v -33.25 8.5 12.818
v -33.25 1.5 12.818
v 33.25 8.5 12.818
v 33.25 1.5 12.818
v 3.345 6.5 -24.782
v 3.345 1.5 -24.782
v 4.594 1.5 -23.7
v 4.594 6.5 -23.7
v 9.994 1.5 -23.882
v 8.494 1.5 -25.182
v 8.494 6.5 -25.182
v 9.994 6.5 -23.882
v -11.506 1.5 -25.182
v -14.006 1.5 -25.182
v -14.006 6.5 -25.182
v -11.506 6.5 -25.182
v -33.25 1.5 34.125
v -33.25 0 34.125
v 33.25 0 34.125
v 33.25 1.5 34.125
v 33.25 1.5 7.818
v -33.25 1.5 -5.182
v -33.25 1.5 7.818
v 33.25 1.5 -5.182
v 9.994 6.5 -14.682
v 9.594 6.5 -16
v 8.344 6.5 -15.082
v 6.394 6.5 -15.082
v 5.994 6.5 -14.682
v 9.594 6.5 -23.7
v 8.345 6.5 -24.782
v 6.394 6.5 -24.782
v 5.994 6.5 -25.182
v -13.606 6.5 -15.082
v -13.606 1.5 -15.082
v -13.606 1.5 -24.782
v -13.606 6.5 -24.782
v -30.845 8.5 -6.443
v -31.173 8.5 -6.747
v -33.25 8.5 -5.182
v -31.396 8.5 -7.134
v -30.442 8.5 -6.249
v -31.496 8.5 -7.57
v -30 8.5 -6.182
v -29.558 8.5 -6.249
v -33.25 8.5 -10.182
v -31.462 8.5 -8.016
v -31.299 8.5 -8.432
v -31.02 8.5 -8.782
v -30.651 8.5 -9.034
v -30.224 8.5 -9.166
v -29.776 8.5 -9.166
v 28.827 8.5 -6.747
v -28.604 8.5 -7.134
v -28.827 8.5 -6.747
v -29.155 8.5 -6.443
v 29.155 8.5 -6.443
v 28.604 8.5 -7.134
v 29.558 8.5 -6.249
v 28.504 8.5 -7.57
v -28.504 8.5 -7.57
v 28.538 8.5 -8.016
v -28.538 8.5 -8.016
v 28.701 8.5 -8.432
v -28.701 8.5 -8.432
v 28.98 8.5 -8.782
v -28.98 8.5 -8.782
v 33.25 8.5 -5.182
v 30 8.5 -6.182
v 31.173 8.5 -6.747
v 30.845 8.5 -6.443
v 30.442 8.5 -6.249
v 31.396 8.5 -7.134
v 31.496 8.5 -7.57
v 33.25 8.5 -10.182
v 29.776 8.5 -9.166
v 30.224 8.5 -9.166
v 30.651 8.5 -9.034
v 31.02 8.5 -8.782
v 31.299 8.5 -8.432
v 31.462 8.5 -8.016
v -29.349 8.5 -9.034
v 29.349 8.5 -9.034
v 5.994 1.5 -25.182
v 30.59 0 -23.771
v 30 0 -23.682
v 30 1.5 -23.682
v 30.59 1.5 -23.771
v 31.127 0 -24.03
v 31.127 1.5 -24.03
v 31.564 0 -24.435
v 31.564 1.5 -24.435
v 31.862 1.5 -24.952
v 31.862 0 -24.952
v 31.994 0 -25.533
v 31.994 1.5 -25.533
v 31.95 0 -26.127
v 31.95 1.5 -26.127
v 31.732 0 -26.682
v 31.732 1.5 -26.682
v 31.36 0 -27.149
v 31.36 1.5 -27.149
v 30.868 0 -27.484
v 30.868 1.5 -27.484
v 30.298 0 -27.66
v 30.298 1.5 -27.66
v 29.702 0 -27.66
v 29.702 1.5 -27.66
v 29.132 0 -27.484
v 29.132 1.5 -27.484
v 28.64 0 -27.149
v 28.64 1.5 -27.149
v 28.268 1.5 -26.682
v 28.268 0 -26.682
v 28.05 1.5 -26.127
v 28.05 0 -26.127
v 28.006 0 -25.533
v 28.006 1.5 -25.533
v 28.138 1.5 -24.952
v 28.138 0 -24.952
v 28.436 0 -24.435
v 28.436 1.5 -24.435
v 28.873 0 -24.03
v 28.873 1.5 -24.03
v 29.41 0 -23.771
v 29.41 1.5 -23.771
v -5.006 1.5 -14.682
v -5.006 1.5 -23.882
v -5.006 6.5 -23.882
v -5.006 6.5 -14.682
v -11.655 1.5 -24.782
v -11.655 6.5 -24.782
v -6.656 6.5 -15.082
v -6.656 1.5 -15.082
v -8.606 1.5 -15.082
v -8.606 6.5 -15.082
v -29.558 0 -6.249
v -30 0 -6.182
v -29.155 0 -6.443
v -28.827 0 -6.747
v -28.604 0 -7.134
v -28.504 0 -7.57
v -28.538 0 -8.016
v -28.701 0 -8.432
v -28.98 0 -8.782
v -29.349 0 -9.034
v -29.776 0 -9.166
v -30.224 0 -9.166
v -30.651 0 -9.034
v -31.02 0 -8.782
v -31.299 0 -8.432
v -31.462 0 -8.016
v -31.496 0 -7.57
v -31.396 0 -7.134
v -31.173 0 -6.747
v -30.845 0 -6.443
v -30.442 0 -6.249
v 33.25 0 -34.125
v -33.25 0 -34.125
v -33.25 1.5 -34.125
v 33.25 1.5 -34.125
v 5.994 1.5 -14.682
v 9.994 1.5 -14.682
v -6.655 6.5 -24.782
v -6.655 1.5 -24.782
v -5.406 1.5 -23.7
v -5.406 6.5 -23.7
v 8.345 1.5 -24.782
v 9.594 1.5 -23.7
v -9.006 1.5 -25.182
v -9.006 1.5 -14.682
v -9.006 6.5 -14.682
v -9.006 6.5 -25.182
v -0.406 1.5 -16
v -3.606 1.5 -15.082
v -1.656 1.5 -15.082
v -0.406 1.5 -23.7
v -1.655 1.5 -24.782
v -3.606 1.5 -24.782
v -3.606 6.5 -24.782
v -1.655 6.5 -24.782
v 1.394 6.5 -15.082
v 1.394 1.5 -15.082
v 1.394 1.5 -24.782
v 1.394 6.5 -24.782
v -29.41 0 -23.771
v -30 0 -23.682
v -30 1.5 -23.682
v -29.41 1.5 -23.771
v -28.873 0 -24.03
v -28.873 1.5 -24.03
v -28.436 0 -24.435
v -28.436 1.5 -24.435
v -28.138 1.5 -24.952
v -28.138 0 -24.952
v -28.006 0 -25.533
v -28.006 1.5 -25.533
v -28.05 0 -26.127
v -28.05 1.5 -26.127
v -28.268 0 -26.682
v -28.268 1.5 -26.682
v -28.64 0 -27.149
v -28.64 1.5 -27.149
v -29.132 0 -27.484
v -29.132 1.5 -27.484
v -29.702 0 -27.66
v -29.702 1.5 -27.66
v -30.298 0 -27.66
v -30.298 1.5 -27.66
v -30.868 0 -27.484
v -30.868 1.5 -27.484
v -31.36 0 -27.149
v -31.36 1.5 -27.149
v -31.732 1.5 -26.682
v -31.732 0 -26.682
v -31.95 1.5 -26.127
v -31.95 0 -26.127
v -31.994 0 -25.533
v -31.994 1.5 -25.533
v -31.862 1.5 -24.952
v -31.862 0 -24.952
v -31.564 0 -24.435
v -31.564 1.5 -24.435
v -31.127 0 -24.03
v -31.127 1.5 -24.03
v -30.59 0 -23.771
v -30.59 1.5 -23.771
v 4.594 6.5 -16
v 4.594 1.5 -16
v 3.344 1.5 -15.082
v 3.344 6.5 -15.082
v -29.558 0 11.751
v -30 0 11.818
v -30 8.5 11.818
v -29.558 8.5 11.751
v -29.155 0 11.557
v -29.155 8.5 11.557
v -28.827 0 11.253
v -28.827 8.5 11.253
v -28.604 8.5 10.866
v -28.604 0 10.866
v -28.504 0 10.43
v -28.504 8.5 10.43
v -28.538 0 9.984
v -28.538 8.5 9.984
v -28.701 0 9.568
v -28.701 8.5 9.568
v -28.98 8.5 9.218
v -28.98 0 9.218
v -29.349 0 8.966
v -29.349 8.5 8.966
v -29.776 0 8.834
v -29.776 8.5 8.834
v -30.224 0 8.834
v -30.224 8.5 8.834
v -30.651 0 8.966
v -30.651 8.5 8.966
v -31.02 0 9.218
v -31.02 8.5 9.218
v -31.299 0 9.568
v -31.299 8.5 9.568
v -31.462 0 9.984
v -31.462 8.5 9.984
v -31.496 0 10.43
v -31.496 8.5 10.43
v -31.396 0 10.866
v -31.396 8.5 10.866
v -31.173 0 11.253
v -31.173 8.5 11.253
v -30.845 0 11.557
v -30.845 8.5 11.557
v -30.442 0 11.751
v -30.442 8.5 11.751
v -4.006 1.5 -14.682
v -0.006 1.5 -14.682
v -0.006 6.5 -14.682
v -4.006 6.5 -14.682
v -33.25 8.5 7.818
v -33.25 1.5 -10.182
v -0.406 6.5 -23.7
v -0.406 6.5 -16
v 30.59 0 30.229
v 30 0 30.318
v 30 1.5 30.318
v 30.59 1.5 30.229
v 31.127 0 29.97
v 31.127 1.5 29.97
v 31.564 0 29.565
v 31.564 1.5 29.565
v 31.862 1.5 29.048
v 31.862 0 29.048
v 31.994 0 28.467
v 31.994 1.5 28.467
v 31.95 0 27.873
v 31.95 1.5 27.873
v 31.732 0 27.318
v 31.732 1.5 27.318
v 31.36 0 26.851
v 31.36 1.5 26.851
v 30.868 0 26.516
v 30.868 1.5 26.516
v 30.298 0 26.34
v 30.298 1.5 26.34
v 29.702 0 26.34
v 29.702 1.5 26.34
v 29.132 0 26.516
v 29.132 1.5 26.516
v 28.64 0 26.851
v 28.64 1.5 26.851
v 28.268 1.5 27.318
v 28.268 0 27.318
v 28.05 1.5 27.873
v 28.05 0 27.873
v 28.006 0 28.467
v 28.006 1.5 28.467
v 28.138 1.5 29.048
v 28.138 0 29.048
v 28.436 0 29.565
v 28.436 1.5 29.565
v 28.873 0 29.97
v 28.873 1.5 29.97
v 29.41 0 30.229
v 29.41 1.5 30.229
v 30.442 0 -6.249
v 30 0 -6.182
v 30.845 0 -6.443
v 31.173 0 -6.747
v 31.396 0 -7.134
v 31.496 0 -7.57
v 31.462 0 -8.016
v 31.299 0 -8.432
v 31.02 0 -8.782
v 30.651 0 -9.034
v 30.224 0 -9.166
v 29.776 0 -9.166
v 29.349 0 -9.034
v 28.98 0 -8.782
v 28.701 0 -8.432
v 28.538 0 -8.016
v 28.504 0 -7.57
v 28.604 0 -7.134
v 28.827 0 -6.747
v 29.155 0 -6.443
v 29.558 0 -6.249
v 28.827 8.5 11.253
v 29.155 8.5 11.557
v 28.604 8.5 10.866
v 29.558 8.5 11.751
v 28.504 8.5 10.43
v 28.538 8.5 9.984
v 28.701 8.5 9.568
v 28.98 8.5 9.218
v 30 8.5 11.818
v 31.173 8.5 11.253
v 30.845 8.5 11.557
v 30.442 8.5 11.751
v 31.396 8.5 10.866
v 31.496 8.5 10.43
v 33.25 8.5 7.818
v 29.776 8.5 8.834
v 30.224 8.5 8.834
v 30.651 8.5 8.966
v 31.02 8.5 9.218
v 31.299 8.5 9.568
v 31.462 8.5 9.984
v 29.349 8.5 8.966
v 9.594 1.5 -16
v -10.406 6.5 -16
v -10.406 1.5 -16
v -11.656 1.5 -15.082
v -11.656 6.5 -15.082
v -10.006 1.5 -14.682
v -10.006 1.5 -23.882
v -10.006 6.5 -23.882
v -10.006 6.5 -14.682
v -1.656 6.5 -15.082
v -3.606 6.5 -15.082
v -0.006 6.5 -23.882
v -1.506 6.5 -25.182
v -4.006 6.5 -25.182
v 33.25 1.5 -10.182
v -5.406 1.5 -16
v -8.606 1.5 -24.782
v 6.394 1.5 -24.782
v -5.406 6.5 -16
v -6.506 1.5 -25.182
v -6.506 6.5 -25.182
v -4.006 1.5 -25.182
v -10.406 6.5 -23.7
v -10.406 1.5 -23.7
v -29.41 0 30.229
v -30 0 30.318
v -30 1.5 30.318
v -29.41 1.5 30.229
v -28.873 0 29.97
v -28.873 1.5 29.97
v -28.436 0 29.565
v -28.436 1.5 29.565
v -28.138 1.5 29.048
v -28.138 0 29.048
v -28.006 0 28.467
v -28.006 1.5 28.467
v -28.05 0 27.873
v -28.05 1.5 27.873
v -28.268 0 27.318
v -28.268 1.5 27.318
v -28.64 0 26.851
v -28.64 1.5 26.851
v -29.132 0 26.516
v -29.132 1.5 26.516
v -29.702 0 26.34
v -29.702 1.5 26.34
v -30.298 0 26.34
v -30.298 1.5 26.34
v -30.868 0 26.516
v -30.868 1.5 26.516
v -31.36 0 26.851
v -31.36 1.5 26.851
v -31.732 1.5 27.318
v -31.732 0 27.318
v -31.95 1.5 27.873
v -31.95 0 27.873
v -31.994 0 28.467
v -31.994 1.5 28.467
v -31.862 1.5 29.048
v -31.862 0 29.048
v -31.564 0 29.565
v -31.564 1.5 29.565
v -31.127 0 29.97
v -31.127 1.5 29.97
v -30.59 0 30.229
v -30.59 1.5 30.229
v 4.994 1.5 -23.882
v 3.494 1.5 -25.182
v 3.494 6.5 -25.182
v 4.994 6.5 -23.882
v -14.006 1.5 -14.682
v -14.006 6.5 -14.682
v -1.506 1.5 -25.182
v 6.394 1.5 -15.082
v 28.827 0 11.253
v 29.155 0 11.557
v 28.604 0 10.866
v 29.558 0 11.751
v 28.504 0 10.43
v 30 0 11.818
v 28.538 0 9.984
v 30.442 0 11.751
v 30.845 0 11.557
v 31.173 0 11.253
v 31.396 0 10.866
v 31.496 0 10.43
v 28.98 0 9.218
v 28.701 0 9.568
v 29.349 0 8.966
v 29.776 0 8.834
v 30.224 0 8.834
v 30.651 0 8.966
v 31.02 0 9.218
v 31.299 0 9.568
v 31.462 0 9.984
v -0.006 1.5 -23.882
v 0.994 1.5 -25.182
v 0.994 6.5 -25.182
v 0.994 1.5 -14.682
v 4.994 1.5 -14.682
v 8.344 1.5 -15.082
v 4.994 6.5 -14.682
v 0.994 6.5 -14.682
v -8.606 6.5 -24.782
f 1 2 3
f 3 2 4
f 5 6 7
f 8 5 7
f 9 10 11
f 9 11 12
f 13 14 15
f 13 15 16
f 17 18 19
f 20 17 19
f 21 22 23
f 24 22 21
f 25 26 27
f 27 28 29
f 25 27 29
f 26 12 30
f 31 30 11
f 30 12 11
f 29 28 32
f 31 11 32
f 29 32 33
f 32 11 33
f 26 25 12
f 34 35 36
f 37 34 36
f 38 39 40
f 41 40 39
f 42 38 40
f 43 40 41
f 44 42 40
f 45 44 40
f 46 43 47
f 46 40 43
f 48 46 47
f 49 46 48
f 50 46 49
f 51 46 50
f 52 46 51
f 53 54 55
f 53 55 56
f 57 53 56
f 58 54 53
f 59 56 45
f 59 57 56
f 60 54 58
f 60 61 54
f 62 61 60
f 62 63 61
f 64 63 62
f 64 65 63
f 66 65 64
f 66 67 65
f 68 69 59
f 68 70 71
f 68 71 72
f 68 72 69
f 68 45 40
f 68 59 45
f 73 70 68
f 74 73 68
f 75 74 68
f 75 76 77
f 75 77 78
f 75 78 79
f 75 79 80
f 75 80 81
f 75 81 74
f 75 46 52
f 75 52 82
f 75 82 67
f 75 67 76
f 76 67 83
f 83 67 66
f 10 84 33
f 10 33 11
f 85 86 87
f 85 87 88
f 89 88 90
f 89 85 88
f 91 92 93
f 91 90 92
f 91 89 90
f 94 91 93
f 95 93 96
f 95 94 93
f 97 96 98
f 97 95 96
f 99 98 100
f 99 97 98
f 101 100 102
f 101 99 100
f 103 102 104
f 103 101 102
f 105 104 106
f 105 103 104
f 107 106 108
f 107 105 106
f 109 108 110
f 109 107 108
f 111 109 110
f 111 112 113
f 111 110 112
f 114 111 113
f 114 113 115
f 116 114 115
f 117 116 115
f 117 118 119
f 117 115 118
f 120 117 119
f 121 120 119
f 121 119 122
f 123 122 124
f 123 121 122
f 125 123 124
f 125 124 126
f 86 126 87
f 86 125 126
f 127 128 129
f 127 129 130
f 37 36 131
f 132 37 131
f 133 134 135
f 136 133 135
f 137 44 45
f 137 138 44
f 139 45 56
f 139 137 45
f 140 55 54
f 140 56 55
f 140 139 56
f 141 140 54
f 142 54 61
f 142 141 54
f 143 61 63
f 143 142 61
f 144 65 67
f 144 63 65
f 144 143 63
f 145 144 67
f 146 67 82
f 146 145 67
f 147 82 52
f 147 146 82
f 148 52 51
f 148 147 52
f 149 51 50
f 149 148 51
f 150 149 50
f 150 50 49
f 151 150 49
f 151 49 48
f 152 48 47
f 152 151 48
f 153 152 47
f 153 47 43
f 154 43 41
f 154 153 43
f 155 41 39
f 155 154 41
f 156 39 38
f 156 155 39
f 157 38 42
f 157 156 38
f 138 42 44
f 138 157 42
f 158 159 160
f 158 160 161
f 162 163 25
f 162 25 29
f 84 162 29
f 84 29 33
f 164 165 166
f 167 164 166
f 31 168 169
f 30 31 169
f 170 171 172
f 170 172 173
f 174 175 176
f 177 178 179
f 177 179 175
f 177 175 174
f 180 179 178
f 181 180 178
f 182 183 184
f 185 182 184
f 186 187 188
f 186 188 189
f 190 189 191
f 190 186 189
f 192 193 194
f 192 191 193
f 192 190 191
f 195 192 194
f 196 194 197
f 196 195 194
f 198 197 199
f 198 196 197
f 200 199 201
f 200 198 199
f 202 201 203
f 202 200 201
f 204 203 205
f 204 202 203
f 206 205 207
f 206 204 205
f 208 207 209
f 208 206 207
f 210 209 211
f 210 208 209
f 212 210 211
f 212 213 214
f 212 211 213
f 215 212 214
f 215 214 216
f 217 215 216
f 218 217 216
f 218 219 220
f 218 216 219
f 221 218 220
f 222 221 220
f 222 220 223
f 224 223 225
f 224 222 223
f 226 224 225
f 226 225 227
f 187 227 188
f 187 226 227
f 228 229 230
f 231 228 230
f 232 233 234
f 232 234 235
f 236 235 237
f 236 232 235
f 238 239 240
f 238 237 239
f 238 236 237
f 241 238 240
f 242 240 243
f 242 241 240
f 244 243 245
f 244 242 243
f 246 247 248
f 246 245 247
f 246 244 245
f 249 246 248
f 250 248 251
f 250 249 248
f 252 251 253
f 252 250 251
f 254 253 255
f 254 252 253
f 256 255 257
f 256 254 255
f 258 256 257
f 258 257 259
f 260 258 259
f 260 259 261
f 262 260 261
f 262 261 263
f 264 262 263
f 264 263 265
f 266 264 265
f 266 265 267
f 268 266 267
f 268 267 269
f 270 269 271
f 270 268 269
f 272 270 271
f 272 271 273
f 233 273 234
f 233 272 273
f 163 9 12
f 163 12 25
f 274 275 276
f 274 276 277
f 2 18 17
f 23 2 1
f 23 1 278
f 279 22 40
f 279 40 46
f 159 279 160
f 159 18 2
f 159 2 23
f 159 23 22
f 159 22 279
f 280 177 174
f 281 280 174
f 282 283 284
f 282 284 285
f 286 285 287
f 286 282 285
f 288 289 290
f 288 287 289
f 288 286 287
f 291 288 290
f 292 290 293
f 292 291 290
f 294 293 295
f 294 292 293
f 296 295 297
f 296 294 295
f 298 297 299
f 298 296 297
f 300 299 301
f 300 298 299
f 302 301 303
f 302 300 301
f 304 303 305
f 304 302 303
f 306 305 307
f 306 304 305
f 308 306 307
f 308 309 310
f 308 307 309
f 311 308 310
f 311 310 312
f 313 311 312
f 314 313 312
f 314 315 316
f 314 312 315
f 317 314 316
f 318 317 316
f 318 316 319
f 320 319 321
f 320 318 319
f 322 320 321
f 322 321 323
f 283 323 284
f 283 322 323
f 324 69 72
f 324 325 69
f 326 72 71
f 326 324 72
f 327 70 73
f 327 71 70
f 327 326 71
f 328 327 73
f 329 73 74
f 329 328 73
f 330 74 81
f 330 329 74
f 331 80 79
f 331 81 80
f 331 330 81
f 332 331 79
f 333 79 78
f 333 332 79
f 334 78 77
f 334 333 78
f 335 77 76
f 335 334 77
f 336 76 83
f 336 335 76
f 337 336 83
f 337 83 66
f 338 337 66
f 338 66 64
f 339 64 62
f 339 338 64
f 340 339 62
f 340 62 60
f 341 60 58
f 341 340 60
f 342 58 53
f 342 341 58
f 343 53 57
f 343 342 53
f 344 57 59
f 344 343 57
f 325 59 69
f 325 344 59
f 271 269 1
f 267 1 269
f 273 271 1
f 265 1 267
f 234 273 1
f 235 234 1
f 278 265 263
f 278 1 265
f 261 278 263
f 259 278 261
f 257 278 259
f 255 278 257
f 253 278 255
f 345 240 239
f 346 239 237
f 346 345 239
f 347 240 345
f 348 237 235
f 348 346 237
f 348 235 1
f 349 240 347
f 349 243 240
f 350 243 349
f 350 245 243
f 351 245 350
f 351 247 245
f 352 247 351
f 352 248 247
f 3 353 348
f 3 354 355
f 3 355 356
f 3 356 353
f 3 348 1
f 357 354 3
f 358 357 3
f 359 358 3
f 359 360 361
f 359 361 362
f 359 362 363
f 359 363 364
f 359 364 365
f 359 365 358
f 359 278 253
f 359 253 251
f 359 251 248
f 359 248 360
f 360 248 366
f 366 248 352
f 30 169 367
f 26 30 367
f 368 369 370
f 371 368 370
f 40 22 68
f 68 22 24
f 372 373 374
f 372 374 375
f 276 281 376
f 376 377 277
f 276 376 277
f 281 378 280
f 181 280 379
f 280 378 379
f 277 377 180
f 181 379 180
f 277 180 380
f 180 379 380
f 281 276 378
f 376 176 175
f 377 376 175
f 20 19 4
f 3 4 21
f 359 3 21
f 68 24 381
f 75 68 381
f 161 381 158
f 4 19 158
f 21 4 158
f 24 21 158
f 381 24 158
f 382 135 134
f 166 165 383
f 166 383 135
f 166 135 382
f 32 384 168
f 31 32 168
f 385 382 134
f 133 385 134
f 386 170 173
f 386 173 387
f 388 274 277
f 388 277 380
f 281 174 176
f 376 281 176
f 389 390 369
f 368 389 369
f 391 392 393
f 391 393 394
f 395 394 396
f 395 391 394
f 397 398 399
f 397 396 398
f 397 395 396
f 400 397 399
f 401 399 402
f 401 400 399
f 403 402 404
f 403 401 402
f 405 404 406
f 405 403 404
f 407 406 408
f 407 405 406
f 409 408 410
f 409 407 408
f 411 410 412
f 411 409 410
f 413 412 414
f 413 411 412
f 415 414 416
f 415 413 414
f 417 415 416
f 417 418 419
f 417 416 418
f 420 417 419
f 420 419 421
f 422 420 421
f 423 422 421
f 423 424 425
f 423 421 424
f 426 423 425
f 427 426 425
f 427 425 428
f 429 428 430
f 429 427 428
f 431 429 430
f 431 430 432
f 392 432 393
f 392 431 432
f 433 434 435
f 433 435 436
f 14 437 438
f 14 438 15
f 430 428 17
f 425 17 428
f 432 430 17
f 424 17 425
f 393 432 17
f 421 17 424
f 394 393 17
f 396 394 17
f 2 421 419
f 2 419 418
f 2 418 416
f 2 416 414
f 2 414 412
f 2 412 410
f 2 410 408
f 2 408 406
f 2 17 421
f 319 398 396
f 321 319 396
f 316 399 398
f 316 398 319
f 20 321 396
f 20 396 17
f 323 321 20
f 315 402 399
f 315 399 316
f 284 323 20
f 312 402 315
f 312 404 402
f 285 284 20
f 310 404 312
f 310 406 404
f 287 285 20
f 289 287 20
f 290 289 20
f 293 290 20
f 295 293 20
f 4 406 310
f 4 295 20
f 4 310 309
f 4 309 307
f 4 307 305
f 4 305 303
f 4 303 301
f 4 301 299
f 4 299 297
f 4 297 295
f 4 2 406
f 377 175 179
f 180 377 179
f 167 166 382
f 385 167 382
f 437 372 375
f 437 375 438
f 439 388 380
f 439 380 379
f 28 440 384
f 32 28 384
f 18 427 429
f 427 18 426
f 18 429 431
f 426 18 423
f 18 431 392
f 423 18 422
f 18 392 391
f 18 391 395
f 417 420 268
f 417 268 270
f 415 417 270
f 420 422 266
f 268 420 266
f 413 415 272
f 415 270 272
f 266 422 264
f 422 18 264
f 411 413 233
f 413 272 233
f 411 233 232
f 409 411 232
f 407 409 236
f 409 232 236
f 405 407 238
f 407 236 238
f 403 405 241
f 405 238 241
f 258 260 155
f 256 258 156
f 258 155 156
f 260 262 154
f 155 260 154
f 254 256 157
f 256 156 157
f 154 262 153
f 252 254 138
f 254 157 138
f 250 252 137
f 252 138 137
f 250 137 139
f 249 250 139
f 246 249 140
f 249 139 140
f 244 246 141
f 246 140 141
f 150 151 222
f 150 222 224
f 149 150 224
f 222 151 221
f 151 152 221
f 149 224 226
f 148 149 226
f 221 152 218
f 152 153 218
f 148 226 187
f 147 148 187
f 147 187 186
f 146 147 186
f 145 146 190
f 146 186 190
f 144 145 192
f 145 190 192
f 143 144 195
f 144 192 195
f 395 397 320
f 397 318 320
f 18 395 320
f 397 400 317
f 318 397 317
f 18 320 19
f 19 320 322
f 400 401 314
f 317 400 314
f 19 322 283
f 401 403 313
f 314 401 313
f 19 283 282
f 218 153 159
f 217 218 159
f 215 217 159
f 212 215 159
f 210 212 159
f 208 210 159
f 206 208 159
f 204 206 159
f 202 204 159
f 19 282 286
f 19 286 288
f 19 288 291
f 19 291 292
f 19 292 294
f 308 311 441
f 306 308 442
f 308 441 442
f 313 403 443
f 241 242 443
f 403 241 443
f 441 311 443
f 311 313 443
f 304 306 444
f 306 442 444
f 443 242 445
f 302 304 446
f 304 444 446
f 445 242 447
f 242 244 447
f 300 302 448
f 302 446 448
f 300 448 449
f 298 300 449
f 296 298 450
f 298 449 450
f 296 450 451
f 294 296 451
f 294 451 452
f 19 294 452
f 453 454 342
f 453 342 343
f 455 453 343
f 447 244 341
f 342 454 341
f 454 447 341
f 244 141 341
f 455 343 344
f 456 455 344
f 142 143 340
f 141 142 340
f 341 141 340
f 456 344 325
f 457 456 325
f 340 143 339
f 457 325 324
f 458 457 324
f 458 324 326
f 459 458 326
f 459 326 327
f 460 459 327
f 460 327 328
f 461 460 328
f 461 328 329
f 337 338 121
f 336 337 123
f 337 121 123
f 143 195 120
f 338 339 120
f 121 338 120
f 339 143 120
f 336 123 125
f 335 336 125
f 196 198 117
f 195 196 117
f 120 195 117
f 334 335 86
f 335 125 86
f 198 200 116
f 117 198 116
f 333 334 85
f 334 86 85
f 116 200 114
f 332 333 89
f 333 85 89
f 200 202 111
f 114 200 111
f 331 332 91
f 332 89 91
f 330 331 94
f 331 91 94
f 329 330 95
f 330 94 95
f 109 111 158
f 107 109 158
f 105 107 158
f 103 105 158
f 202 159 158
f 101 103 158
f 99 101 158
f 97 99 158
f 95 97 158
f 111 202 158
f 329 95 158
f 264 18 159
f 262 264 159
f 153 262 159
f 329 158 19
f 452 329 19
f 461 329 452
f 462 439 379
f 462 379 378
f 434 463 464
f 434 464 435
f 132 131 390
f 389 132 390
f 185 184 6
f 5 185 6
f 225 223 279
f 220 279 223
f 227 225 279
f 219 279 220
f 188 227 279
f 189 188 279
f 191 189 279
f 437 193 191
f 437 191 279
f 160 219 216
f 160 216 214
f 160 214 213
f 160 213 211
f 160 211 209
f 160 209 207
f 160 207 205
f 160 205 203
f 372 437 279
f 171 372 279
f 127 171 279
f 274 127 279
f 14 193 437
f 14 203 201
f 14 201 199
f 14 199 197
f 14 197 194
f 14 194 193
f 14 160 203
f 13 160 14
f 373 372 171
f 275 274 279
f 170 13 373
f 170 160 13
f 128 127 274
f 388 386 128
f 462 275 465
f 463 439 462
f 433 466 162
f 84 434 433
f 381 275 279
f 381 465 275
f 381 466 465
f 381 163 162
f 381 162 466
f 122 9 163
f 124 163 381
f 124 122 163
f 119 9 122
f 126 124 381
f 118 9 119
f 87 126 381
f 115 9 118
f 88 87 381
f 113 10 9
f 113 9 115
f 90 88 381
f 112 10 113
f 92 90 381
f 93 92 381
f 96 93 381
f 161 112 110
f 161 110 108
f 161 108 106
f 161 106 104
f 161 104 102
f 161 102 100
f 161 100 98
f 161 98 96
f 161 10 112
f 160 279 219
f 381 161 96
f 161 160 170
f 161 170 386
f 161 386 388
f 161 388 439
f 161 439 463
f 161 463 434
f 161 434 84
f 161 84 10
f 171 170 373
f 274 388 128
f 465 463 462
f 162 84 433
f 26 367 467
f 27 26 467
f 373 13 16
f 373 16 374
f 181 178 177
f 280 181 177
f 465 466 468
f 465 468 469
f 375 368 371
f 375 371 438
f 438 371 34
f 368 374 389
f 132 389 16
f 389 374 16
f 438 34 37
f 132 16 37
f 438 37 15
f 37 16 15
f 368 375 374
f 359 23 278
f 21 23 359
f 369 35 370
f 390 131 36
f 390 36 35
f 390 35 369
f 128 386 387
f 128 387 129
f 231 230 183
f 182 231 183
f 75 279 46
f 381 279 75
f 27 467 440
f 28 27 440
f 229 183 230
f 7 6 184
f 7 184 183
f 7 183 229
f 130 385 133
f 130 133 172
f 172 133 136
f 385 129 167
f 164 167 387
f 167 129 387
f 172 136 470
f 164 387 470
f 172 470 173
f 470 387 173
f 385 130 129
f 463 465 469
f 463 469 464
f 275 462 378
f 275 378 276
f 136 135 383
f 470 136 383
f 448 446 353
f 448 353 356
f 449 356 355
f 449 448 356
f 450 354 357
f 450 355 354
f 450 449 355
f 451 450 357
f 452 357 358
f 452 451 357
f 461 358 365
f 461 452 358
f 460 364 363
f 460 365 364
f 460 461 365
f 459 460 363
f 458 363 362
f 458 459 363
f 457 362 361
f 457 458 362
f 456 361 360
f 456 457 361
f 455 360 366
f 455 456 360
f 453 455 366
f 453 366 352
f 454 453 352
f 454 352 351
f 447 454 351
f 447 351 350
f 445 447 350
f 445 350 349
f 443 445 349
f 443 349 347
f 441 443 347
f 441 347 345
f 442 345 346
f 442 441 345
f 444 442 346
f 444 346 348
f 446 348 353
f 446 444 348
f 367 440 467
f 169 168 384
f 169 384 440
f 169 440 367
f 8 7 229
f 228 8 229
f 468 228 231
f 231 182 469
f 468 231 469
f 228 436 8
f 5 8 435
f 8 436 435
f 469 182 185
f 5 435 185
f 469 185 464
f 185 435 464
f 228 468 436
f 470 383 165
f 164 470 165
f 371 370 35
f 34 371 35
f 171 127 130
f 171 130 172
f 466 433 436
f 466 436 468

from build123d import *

# Parameters (mm, degrees)
SKETCH1_W               = 66.5
SKETCH1_H               = 68.25
BOSS_EXTRUDE1_DEPTH     = 1.5
CUT_EXTRUDE1_DEPTH      = 48.668942982
CUT_EXTRUDE1_DEPTH_BACK = 48.668942982
SKETCH3_R               = 2
SKETCH3_R_2             = 1.5
BOSS_EXTRUDE2_DEPTH     = 5
SKETCH6_W               = 66.5
SKETCH6_H               = 5
BOSS_EXTRUDE3_DEPTH     = 7
CUT_EXTRUDE2_DEPTH      = 49.397604538
CUT_EXTRUDE2_DEPTH_BACK = 49.397604538
SKETCH7_R               = 1.5


with BuildPart() as part:
    # Sketch1 → Boss-Extrude1 (new body)
    with BuildSketch(Plane(origin=(0, 0, 0), x_dir=(1, 0, 0), z_dir=(0, 1, 0))):
        Rectangle(SKETCH1_W, SKETCH1_H)
    extrude(amount=BOSS_EXTRUDE1_DEPTH)

    # Sketch3 → Cut-Extrude1 (cut, two sides: drawn at the far end of the back side and taken through both)
    with BuildSketch(Plane(origin=(0, 1.5, 0), x_dir=(1, 0, 0), z_dir=(0, 1, 0)).offset(-CUT_EXTRUDE1_DEPTH_BACK)):
        with Locations(Location((-30, -28.317585536, 0), (0, 0, 270))):
            Circle(SKETCH3_R)
        with Locations(Location((30, -28.317585536, 0), (0, 0, 270))):
            Circle(SKETCH3_R)
        with Locations(Location((30, 25.682414464, 0), (0, 0, 270))):
            Circle(SKETCH3_R)
        with Locations(Location((-30, 25.682414464, 0), (0, 0, 270))):
            Circle(SKETCH3_R)
        with Locations(Location((30, 7.682414464, 0), (0, 0, 270))):
            Circle(SKETCH3_R_2)
        with Locations(Location((30, -10.317585536, 0), (0, 0, 270))):
            Circle(SKETCH3_R_2)
        with Locations(Location((-30, -10.317585536, 0), (0, 0, 270))):
            Circle(SKETCH3_R_2)
        with Locations(Location((-30, 7.682414464, 0), (0, 0, 270))):
            Circle(SKETCH3_R_2)
    extrude(amount=CUT_EXTRUDE1_DEPTH + CUT_EXTRUDE1_DEPTH_BACK, mode=Mode.SUBTRACT)

    # Sketch5 → Boss-Extrude2 (add)
    # profile 1 of 5: a face of its own
    with BuildSketch(Plane(origin=(0, 1.5, 0), x_dir=(1, 0, 0), z_dir=(0, 1, 0))):
        Polygon((-14.006270714, 25.182414464), (-11.506270714, 25.182414464), (-10.006270714, 23.882414464), (-10.006270714, 14.682414464), (-14.006270714, 14.682414464), align=None)
        Polygon((-10.406270714, 23.699762911), (-10.406270714, 15.999762911), (-11.656270714, 15.082414464), (-13.606270714, 15.082414464), (-13.606270714, 24.782414464), (-11.655484044, 24.782414464), align=None, mode=Mode.SUBTRACT)
    # profile 2 of 5: a face of its own
    with BuildSketch(Plane(origin=(0, 1.5, 0), x_dir=(1, 0, 0), z_dir=(0, 1, 0))):
        Polygon((-9.006270714, 25.182414464), (-6.506270714, 25.182414464), (-5.006270714, 23.882414464), (-5.006270714, 14.682414464), (-9.006270714, 14.682414464), align=None)
        Polygon((-5.406270714, 23.699762911), (-5.406270714, 15.999762911), (-6.656270714, 15.082414464), (-8.606270714, 15.082414464), (-8.606270714, 24.782414464), (-6.655484044, 24.782414464), align=None, mode=Mode.SUBTRACT)
    # profile 3 of 5: a face of its own
    with BuildSketch(Plane(origin=(0, 1.5, 0), x_dir=(1, 0, 0), z_dir=(0, 1, 0))):
        Polygon((-4.006270714, 25.182414464), (-1.506270714, 25.182414464), (-0.006270714, 23.882414464), (-0.006270714, 14.682414464), (-4.006270714, 14.682414464), align=None)
        Polygon((-0.406270714, 23.699762911), (-0.406270714, 15.999762911), (-1.656270714, 15.082414464), (-3.606270714, 15.082414464), (-3.606270714, 24.782414464), (-1.655484044, 24.782414464), align=None, mode=Mode.SUBTRACT)
    # profile 4 of 5: a face of its own
    with BuildSketch(Plane(origin=(0, 1.5, 0), x_dir=(1, 0, 0), z_dir=(0, 1, 0))):
        Polygon((0.993729286, 25.182414464), (3.493729286, 25.182414464), (4.993729286, 23.882414464), (4.993729286, 14.682414464), (0.993729286, 14.682414464), align=None)
        Polygon((4.593729286, 23.699762911), (4.593729286, 15.999762911), (3.343729286, 15.082414464), (1.393729286, 15.082414464), (1.393729286, 24.782414464), (3.344515956, 24.782414464), align=None, mode=Mode.SUBTRACT)
    # profile 5 of 5: a face of its own
    with BuildSketch(Plane(origin=(0, 1.5, 0), x_dir=(1, 0, 0), z_dir=(0, 1, 0))):
        Polygon((5.993729286, 25.182414464), (8.493729286, 25.182414464), (9.993729286, 23.882414464), (9.993729286, 14.682414464), (5.993729286, 14.682414464), align=None)
        Polygon((9.593729286, 23.699762911), (9.593729286, 15.999762911), (8.343729286, 15.082414464), (6.393729286, 15.082414464), (6.393729286, 24.782414464), (8.344515956, 24.782414464), align=None, mode=Mode.SUBTRACT)
    extrude(amount=BOSS_EXTRUDE2_DEPTH)

    # Sketch6 → Boss-Extrude3 (add)
    with BuildSketch(Plane(origin=(0, 1.5, 0), x_dir=(1, 0, 0), z_dir=(0, 1, 0))):
        with Locations((0, 7.682414464)):
            Rectangle(SKETCH6_W, SKETCH6_H)
        with Locations((0, -10.317585536)):
            Rectangle(SKETCH6_W, SKETCH6_H)
    extrude(amount=BOSS_EXTRUDE3_DEPTH)

    # Sketch7 → Cut-Extrude2 (cut, two sides: drawn at the far end of the back side and taken through both)
    with BuildSketch(Plane(origin=(0, 8.5, 0), x_dir=(1, 0, 0), z_dir=(0, 1, 0)).offset(-CUT_EXTRUDE2_DEPTH_BACK)):
        with Locations(Location((-30, 7.682414464, 0), (0, 0, 270))):
            Circle(SKETCH7_R)
        with Locations(Location((-30, -10.317585536, 0), (0, 0, 270))):
            Circle(SKETCH7_R)
        with Locations(Location((30, -10.317585536, 0), (0, 0, 270))):
            Circle(SKETCH7_R)
        with Locations(Location((30, 7.682414464, 0), (0, 0, 270))):
            Circle(SKETCH7_R)
    extrude(amount=CUT_EXTRUDE2_DEPTH + CUT_EXTRUDE2_DEPTH_BACK, mode=Mode.SUBTRACT)


solid = part.part
